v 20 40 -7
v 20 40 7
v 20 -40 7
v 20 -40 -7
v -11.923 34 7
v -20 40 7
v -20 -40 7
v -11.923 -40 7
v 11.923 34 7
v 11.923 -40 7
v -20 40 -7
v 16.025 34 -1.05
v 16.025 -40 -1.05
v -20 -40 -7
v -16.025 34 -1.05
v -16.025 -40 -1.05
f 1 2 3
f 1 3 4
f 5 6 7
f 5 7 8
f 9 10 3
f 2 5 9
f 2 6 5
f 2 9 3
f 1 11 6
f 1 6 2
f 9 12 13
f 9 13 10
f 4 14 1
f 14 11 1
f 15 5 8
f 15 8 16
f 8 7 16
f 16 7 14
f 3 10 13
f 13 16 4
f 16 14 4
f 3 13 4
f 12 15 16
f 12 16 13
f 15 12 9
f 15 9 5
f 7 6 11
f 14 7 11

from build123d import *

# Parameters (mm, degrees)
SKETCH1_W           = 40
SKETCH1_H           = 14
BOSS_EXTRUDE1_DEPTH = 40
CUT_EXTRUDE1_DEPTH  = 74


with BuildPart() as part:
    # Sketch1 → Boss-Extrude1 (new, symmetric)
    with BuildSketch(Plane(origin=(0, 0, 0), x_dir=(1, 0, 0), z_dir=(0, 1, 0))):
        Rectangle(SKETCH1_W, SKETCH1_H)
    extrude(amount=BOSS_EXTRUDE1_DEPTH, both=True)

    # Sketch3 → Cut-Extrude1 (cut)
    with BuildSketch(Plane(origin=(0, 34, 0), x_dir=(1, 0, 0), z_dir=(0, 1, 0))):
        Polygon((-16.025, 1.05), (16.025, 1.05), (11.923320132, -7), (-11.923320132, -7), align=None)
    extrude(amount=-CUT_EXTRUDE1_DEPTH, mode=Mode.SUBTRACT)


solid = part.part
